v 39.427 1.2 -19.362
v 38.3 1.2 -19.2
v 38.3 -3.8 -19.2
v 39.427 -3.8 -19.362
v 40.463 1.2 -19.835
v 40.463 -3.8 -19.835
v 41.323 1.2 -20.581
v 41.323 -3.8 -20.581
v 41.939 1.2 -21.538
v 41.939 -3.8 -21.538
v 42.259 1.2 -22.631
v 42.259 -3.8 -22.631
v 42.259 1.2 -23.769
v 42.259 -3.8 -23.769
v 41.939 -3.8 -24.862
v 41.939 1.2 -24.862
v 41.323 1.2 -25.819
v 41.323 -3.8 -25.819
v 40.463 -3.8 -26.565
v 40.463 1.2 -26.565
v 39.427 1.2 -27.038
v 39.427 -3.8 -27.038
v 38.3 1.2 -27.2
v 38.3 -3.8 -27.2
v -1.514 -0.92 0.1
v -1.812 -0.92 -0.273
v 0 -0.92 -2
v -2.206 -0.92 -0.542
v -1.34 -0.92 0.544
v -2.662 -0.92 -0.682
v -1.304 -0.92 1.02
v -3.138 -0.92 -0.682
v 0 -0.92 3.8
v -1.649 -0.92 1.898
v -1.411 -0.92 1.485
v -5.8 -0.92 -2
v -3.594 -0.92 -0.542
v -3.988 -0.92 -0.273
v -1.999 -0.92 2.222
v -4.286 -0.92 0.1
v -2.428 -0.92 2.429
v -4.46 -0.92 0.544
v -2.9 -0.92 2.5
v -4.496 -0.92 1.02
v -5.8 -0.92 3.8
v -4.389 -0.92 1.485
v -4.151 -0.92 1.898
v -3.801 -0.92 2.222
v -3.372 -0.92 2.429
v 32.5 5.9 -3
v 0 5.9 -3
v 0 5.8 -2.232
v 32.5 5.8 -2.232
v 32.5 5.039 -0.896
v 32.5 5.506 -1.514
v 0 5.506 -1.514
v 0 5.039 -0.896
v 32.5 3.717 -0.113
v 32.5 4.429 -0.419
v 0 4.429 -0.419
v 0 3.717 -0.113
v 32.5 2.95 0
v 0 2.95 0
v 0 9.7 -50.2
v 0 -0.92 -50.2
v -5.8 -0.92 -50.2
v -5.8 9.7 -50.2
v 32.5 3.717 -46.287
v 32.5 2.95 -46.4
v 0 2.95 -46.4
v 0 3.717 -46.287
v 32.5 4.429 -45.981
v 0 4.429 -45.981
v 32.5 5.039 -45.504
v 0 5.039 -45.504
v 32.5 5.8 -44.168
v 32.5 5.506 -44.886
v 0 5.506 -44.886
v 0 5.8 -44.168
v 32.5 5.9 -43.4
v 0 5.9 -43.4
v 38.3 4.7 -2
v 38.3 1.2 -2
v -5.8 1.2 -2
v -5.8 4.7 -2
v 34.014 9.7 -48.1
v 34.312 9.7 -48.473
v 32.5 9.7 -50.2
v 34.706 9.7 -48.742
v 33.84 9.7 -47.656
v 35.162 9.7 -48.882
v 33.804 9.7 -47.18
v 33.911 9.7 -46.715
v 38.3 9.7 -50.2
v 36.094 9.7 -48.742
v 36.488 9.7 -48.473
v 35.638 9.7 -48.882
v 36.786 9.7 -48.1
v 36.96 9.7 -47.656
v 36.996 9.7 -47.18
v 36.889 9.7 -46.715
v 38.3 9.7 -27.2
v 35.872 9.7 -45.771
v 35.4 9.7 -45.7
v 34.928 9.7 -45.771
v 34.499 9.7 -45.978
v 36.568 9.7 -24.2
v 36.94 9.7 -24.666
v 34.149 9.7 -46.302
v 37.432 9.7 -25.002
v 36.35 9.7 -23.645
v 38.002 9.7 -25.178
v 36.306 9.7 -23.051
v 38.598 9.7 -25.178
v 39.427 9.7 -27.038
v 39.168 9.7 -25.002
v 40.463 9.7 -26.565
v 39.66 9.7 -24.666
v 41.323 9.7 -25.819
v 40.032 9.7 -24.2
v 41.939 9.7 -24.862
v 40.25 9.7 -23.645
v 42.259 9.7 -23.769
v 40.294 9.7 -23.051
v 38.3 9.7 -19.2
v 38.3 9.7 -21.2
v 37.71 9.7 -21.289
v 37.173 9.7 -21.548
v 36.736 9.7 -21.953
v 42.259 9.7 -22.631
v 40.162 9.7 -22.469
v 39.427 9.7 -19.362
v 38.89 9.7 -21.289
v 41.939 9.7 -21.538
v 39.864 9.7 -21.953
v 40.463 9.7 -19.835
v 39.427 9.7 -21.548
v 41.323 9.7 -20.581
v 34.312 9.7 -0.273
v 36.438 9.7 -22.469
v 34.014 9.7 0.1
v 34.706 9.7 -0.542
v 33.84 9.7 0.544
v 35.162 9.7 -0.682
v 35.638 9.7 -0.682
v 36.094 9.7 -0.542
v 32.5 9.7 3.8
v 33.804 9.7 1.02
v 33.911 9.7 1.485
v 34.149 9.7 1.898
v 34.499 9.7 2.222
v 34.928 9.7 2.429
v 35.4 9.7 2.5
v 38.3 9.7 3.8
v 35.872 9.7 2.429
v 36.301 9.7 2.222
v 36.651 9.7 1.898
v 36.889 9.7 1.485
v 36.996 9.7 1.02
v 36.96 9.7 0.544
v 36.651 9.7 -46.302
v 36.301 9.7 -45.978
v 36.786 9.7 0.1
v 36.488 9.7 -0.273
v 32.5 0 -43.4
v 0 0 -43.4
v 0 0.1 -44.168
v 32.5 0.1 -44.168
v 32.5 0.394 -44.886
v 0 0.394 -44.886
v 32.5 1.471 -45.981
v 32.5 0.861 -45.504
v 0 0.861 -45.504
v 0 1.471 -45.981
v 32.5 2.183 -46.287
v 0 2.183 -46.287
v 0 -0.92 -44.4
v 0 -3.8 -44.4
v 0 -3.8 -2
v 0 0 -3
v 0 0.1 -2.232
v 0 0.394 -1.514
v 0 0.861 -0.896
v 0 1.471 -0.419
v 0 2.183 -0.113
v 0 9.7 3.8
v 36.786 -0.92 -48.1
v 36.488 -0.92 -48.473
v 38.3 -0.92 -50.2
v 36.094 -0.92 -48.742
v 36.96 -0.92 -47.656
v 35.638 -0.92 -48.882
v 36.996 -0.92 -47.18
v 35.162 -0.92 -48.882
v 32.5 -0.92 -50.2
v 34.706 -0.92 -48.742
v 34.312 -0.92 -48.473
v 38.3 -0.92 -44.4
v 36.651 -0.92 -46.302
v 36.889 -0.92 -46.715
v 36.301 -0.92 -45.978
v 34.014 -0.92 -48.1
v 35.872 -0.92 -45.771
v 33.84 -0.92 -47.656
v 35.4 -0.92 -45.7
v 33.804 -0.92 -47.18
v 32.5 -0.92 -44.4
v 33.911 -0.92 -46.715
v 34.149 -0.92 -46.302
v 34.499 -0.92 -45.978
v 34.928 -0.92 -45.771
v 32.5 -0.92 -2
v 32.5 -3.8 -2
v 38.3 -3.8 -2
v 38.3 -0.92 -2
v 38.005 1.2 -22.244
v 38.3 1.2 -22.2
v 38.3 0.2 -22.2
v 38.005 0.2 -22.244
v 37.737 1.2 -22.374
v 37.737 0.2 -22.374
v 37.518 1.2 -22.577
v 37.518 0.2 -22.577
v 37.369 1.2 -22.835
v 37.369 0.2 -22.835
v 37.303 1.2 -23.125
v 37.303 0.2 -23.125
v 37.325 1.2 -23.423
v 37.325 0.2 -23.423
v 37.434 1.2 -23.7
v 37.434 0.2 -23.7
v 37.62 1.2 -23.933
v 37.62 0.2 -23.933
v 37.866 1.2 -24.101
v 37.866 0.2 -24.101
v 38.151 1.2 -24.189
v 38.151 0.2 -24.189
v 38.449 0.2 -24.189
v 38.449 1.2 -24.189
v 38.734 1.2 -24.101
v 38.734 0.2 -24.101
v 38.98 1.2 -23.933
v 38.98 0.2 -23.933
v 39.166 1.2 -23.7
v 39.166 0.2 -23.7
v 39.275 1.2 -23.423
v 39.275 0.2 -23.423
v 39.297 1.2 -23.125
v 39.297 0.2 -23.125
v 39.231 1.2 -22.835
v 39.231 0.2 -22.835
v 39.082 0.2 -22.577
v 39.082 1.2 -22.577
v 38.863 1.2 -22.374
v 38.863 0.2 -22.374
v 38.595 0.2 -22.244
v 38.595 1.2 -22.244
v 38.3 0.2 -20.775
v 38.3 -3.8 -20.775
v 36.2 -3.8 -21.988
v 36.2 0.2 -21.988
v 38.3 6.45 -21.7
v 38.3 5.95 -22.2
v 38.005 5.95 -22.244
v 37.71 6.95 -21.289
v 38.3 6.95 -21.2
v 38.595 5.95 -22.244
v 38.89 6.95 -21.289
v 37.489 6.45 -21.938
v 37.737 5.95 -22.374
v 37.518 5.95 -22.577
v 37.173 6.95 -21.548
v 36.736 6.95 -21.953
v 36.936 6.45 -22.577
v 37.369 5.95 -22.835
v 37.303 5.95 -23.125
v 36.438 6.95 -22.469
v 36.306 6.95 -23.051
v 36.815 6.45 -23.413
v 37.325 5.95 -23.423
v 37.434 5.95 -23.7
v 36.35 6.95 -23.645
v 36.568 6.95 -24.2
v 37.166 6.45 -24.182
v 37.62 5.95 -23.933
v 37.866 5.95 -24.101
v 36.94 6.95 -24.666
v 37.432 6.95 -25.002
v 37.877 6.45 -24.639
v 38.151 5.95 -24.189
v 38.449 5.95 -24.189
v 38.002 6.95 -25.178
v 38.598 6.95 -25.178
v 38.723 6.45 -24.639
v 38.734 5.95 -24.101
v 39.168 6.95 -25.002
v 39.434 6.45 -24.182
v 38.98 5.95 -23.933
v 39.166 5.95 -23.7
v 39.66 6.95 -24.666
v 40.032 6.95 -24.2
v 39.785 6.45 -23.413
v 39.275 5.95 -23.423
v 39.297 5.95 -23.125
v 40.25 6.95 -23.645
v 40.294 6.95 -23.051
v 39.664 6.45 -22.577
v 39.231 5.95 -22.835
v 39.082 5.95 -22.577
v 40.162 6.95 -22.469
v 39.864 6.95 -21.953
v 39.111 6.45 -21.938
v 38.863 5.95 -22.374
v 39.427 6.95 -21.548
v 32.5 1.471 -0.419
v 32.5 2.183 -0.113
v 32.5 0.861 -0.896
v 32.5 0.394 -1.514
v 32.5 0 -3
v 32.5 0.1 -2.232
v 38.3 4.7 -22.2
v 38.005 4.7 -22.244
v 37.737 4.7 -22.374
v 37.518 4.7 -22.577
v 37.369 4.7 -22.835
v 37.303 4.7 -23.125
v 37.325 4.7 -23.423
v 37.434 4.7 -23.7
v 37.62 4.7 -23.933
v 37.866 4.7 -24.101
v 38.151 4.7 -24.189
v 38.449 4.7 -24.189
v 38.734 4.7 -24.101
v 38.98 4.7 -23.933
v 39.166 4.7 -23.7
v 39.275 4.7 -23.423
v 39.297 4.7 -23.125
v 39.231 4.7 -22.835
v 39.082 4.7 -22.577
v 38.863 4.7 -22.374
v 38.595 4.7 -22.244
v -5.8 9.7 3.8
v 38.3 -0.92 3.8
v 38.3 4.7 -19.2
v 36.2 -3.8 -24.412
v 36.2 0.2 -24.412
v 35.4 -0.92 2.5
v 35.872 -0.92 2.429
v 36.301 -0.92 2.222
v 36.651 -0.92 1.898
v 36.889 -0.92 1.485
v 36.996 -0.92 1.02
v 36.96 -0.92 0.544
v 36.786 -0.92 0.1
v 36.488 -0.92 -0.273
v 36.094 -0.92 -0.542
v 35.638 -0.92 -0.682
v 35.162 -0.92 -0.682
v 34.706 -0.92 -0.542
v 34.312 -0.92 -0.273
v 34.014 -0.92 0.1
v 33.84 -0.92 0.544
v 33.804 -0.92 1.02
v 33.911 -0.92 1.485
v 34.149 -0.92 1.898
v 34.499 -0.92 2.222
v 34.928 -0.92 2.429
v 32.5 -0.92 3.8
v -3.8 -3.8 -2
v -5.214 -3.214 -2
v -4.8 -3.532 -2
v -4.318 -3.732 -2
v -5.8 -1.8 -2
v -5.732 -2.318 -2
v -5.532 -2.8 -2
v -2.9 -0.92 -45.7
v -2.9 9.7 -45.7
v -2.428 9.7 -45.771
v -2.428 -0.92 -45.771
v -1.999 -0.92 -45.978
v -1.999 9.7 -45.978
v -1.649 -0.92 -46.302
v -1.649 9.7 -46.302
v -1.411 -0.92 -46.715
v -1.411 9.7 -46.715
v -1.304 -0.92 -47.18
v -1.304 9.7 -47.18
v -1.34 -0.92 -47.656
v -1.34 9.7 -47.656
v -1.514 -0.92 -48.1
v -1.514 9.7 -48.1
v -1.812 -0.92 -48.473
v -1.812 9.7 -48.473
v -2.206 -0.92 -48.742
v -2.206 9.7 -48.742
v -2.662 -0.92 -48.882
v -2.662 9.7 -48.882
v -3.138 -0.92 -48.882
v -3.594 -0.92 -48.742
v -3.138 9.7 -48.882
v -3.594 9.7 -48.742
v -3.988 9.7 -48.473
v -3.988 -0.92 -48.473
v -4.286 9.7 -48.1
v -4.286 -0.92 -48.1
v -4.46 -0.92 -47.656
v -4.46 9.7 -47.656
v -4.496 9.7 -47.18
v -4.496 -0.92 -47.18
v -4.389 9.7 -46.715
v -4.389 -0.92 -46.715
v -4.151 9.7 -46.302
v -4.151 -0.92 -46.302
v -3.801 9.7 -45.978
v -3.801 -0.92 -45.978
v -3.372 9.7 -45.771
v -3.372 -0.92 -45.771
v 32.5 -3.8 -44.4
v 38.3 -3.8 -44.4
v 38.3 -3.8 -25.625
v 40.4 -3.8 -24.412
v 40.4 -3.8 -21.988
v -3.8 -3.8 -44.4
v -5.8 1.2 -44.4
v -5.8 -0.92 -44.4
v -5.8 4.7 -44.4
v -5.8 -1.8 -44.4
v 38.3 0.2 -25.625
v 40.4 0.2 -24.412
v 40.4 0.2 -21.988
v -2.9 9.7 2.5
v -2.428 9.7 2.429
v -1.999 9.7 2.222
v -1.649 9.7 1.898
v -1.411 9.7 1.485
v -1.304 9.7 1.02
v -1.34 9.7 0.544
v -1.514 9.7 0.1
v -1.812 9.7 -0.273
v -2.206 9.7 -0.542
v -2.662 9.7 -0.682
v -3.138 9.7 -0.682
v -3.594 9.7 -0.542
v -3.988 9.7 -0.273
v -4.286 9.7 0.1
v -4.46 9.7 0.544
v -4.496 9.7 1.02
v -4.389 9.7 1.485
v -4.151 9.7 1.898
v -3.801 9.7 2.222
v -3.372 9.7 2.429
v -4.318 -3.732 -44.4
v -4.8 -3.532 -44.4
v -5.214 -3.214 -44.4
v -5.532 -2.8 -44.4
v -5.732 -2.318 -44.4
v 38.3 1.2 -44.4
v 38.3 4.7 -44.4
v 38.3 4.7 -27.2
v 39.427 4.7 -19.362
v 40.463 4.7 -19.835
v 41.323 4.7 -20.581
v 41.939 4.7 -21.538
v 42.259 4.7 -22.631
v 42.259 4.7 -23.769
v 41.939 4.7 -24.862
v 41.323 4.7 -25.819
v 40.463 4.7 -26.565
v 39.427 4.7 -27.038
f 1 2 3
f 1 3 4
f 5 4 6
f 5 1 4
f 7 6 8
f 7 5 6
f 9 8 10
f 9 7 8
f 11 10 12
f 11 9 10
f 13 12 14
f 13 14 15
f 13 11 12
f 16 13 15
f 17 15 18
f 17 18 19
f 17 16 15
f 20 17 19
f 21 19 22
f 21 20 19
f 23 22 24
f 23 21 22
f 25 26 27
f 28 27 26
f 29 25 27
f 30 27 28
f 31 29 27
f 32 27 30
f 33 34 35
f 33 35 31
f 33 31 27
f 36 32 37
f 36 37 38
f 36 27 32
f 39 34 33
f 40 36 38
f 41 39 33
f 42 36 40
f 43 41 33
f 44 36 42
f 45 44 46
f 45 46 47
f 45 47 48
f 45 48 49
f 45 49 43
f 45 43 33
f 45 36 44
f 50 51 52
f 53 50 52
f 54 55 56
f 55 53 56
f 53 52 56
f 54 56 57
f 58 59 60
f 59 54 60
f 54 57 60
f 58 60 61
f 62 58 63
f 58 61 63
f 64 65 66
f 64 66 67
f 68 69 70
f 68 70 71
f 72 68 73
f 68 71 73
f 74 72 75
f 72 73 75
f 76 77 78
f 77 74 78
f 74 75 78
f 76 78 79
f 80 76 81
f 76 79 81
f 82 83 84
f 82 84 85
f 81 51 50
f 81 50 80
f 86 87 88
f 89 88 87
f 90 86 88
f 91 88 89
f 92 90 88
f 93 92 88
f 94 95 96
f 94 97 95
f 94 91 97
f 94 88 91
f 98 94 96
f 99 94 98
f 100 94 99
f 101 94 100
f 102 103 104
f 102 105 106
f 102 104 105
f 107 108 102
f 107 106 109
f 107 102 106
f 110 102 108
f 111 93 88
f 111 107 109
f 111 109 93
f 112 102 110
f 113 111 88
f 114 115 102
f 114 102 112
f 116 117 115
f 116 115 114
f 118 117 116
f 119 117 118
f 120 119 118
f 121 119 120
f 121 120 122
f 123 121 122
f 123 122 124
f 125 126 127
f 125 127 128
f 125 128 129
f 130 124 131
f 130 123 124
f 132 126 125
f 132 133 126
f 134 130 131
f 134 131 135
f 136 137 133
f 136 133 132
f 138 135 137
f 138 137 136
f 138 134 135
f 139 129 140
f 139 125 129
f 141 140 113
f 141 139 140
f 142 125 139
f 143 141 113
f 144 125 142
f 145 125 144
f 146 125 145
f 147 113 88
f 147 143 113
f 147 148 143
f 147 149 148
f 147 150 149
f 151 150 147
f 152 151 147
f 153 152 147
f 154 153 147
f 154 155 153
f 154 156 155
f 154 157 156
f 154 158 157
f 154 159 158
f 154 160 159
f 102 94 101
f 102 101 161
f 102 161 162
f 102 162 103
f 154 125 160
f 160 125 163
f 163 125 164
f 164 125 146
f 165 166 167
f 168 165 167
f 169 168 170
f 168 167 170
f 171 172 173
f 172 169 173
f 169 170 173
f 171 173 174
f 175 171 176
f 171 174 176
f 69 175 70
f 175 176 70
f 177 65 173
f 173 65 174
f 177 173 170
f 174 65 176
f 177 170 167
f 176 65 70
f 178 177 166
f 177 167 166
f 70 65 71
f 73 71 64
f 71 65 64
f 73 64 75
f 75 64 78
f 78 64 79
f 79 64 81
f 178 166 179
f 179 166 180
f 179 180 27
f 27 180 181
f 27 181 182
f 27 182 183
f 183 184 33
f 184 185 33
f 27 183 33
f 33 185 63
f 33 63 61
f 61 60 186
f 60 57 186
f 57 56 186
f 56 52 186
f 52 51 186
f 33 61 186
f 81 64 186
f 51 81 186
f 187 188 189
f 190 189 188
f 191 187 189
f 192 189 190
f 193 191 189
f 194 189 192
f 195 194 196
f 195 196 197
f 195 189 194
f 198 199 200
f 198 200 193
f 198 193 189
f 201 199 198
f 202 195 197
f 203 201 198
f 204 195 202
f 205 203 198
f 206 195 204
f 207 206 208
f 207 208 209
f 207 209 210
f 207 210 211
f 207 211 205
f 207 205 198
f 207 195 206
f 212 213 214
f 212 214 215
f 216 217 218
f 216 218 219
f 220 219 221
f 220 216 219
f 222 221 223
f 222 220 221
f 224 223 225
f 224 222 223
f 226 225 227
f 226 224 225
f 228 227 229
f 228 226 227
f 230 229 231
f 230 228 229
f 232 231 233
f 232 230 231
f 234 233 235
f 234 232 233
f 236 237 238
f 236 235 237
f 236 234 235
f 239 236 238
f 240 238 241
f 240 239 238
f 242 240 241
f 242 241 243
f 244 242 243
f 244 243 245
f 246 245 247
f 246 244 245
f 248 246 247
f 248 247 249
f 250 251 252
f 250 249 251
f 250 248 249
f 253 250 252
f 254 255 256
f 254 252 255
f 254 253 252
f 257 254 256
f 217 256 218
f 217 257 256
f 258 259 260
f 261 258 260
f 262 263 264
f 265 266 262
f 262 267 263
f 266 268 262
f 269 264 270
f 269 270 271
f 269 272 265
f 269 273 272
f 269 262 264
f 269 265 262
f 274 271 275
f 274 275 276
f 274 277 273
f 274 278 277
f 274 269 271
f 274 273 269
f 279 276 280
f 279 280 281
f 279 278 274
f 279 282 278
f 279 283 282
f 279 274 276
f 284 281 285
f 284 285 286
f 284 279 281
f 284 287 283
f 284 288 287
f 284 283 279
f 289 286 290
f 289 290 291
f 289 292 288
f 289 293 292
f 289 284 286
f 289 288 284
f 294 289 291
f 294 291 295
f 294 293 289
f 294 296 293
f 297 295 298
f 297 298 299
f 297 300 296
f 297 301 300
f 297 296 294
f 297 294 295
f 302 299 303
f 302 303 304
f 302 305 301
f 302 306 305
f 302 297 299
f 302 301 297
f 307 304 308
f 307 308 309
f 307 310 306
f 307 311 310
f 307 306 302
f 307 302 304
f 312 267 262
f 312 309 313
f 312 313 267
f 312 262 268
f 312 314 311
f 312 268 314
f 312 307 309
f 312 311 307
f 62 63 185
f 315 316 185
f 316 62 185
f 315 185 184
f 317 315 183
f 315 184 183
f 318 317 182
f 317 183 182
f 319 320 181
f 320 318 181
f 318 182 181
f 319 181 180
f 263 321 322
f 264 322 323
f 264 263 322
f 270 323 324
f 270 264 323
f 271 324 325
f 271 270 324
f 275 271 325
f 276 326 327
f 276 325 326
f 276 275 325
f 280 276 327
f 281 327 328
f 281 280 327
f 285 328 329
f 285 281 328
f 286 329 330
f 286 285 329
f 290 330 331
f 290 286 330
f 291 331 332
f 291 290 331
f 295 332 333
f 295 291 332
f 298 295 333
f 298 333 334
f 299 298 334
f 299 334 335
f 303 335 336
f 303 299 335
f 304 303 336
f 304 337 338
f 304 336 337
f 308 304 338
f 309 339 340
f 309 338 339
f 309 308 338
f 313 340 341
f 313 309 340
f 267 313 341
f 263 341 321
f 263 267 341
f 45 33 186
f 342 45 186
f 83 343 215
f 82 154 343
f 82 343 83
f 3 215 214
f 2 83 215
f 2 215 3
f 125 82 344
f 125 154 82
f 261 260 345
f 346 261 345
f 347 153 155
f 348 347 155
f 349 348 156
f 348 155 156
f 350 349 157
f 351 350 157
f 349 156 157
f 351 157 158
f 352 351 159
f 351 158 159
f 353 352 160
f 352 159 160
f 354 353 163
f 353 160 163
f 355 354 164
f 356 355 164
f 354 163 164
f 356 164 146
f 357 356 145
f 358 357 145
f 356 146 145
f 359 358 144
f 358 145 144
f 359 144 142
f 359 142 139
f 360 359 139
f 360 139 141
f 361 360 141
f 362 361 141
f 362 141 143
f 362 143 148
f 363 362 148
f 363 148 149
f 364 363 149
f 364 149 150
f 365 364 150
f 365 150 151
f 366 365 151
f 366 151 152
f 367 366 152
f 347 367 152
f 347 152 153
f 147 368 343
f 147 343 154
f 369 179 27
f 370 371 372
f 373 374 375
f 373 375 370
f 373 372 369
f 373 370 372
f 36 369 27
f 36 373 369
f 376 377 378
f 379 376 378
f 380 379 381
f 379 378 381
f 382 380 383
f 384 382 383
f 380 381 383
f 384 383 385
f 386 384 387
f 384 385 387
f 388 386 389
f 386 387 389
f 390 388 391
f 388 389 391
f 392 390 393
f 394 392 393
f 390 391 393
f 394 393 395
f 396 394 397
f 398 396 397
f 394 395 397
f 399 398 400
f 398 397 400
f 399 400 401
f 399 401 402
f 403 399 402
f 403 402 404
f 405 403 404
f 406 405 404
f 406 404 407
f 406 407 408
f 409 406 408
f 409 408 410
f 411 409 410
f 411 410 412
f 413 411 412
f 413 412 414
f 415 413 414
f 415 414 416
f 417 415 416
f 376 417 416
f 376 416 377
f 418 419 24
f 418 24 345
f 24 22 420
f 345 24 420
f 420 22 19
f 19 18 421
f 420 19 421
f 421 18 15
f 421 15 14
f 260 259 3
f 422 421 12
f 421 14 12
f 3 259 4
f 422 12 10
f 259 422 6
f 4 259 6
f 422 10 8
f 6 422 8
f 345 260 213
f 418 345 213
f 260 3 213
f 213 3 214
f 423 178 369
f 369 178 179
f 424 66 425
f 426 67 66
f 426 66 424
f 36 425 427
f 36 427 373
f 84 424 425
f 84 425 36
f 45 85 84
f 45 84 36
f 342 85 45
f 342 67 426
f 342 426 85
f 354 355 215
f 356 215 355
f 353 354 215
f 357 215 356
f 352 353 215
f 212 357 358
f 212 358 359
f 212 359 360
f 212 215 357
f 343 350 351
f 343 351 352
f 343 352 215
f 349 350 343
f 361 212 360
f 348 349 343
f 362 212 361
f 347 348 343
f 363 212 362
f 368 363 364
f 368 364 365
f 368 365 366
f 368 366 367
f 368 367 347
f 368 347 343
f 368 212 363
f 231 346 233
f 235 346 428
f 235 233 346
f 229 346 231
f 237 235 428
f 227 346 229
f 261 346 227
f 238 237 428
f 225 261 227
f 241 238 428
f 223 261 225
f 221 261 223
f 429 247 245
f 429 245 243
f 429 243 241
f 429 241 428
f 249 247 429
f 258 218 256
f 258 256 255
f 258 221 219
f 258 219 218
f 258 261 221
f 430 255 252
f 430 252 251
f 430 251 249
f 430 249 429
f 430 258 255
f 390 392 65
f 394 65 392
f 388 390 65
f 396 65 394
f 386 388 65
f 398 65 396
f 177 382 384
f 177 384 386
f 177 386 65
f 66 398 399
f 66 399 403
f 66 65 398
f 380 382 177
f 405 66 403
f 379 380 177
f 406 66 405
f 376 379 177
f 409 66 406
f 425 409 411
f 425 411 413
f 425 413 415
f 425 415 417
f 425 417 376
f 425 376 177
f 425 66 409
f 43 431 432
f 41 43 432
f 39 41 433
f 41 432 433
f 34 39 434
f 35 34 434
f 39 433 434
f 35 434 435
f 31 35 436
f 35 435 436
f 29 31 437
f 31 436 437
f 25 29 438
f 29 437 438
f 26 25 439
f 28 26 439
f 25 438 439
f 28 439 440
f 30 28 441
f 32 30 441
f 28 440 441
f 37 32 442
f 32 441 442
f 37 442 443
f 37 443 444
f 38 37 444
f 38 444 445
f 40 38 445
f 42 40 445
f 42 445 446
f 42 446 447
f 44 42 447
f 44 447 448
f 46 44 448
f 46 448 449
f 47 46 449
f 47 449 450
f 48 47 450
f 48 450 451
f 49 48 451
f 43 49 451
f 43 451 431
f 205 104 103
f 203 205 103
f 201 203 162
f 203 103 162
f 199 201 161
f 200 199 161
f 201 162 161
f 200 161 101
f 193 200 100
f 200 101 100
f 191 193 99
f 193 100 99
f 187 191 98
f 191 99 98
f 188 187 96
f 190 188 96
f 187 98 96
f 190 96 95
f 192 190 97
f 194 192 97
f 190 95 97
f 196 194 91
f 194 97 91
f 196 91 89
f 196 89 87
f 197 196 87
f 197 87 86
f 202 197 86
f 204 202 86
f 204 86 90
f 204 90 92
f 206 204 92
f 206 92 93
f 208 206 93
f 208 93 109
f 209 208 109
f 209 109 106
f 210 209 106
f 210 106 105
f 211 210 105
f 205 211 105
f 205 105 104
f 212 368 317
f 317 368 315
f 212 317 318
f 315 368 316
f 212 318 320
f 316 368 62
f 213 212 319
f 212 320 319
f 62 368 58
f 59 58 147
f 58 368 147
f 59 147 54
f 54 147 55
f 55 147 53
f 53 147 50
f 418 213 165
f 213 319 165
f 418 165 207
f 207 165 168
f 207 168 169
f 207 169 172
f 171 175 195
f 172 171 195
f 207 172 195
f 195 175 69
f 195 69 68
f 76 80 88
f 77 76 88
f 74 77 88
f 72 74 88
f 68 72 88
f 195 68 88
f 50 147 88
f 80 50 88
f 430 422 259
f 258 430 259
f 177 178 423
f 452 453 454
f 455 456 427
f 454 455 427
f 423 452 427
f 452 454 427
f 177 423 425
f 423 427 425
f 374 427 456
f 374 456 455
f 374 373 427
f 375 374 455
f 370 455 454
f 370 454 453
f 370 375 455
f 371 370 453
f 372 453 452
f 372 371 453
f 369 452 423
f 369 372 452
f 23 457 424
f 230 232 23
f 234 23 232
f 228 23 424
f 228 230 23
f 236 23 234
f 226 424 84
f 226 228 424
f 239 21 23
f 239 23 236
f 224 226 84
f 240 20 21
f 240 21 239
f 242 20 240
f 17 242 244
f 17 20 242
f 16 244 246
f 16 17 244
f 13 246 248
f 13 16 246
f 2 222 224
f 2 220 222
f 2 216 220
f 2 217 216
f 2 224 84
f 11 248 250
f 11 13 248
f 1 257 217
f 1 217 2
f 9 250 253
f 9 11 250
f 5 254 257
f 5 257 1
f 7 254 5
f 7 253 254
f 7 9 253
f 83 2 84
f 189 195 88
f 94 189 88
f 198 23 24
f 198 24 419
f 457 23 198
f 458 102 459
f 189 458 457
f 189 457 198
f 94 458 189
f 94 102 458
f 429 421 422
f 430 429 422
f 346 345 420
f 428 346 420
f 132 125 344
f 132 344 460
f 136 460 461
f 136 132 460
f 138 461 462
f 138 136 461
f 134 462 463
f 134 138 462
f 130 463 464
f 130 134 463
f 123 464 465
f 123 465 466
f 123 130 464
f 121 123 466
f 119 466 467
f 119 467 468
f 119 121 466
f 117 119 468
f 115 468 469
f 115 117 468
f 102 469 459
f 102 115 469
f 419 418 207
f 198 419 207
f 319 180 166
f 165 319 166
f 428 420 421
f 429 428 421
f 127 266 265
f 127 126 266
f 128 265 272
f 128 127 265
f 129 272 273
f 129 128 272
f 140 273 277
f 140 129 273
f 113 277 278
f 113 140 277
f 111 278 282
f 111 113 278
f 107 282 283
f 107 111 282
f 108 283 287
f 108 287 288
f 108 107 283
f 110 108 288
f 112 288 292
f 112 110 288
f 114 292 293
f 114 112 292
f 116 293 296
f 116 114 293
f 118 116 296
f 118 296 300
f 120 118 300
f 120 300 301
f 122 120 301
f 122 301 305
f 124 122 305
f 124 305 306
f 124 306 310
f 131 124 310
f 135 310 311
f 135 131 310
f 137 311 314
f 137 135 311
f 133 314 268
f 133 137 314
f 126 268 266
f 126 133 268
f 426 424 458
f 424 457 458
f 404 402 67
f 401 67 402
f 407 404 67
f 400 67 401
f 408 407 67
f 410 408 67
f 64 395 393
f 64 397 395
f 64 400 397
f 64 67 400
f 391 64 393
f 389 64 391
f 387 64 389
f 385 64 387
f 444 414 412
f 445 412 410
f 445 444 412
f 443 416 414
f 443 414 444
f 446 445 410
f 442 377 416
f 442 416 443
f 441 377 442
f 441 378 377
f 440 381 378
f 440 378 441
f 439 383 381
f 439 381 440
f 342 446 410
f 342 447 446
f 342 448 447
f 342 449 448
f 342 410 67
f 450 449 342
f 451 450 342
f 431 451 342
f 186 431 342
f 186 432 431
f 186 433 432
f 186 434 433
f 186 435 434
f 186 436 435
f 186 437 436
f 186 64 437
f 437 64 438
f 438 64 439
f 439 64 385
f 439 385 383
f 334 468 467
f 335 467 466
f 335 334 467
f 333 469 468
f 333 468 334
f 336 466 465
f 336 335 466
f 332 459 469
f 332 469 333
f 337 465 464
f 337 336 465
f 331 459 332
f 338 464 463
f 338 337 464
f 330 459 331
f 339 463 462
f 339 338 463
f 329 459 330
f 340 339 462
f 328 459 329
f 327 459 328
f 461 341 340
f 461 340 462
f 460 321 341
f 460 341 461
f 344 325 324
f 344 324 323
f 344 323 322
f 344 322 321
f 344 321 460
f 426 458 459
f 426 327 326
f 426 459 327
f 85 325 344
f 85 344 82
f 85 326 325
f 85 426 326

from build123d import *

# Parameters (mm, degrees)
SKETCH1_W           = 46.4
SKETCH1_H           = 5.9
SKETCH1_W_2         = 42.4
SKETCH1_H_2         = 3.5
BOSS_EXTRUDE1_DEPTH = 32.5
FILLET2_R           = 3
SKETCH2_W           = 54
SKETCH2_H           = 13.5
SKETCH2_W_2         = 42.4
SKETCH2_H_2         = 3.5
BOSS_EXTRUDE2_DEPTH = 5.8
SKETCH3_W           = 54
SKETCH3_H           = 13.5
SKETCH3_W_2         = 42.4
SKETCH3_H_2         = 3.5
BOSS_EXTRUDE3_DEPTH = 5.8
SKETCH4_R           = 1.6
CUT_EXTRUDE1_DEPTH  = 65.569187698
SKETCH8_R           = 4
BOSS_EXTRUDE4_DEPTH = 13.5
CUT_EXTRUDE4_DEPTH  = 4
SKETCH15_W          = 42.4
SKETCH15_H          = 3.5
SKETCH15_W_2        = 5.8
SKETCH15_H_2        = 2.88
CUT_EXTRUDE5_DEPTH  = 71.197863215
FILLET3_R           = 2


with BuildPart() as part:
    # Sketch1 → Boss-Extrude1 (new body)
    with BuildSketch(Plane(origin=(0, 0, 0), x_dir=(0, 0, -1), z_dir=(1, 0, 0))):
        with Locations((23.2, 2.95)):
            Rectangle(SKETCH1_W, SKETCH1_H)
        with Locations((23.2, 2.95)):
            Rectangle(SKETCH1_W_2, SKETCH1_H_2, mode=Mode.SUBTRACT)
    extrude(amount=BOSS_EXTRUDE1_DEPTH)

    # Fillet2
    # the kernel refuses this fillet: 3 mm, written as the material it takes off along each edge
    with BuildSketch(Plane(origin=(-7.5, 0, -46.4), x_dir=(0, 0, 1), z_dir=(1, 0, 0)), Plane(origin=(-7.5, 5.9, 0), x_dir=(0, 0, -1), z_dir=(1, 0, 0)), Plane(origin=(-7.5, 5.9, -46.4), x_dir=(0, -1, 0), z_dir=(1, 0, 0))) as fillet2_piece_1:
        with BuildLine():
            CenterArc((FILLET2_R, -FILLET2_R), FILLET2_R, 90, 90)
            Line((0, -FILLET2_R), (0, 0))
            Line((0, 0), (FILLET2_R, 0))
        make_face()
    extrude(amount=47.5, mode=Mode.SUBTRACT)
    with BuildSketch(Plane(origin=(-7.5, 0, 0), x_dir=(0, 0, -1), z_dir=(1, 0, 0))) as fillet2_piece_2:
        with BuildLine():
            CenterArc((FILLET2_R, FILLET2_R), FILLET2_R, 180, 90)
            Line((0, FILLET2_R), (0, 0))
            Line((0, 0), (FILLET2_R, 0))
        make_face()
    extrude(amount=47.5, mode=Mode.SUBTRACT)

    # Sketch2 → Boss-Extrude2 (add)
    with BuildSketch(Plane(origin=(32.5, 0, 0), x_dir=(0, 0, -1), z_dir=(1, 0, 0))):
        with Locations((23.2, 2.95)):
            Rectangle(SKETCH2_W, SKETCH2_H)
        with Locations((23.2, 2.95)):
            Rectangle(SKETCH2_W_2, SKETCH2_H_2, mode=Mode.SUBTRACT)
    extrude(amount=BOSS_EXTRUDE2_DEPTH)

    # Sketch3 → Boss-Extrude3 (add)
    with BuildSketch(Plane.ZY):
        with Locations((-23.2, 2.95)):
            Rectangle(SKETCH3_W, SKETCH3_H)
        with Locations((-23.2, 2.95)):
            Rectangle(SKETCH3_W_2, SKETCH3_H_2, mode=Mode.SUBTRACT)
    extrude(amount=BOSS_EXTRUDE3_DEPTH)

    # Sketch4 → Cut-Extrude1 (cut, through all)
    with BuildSketch(Plane(origin=(0, 9.7, 0), x_dir=(1, 0, 0), z_dir=(0, 1, 0))):
        with Locations(Location((-2.9, 47.3, 0), (0, 0, 270))):
            Circle(SKETCH4_R)
        with Locations(Location((35.4, 47.3, 0), (0, 0, 270))):
            Circle(SKETCH4_R)
        with Locations(Location((-2.9, -0.9, 0), (0, 0, 270))):
            Circle(SKETCH4_R)
        with Locations(Location((35.4, -0.9, 0), (0, 0, 270))):
            Circle(SKETCH4_R)
    extrude(amount=-CUT_EXTRUDE1_DEPTH, mode=Mode.SUBTRACT)

    # Sketch8 → Boss-Extrude4 (add)
    with BuildSketch(Plane(origin=(0, 9.7, 0), x_dir=(1, 0, 0), z_dir=(0, 1, 0))):
        with Locations(Location((38.3, 23.2, 0), (0, 0, 270))):
            Circle(SKETCH8_R)
    extrude(amount=-BOSS_EXTRUDE4_DEPTH)

    # Sketch13 → CSK for M2 Flat Head Machine Screw1 (revolve, cut)
    with BuildSketch(Plane(origin=(38.3, 9.7, -23.2), x_dir=(0, 0, 1), z_dir=(1, 0, 0))):
        Polygon((0, 0), (0, 13.5), (1, 13.5), (1, 3.75), (2, 2.75), (2, 0), align=None)
    revolve(axis=Axis((38.3, 16.05, -23.2), (0, -1, 0)), mode=Mode.SUBTRACT)

    # Sketch14 → Cut-Extrude4 (cut)
    with BuildSketch(Plane.XZ.offset(3.8)):
        Polygon((38.3, -20.775128869), (36.2, -21.987564435), (36.2, -24.412435565), (38.3, -25.624871131), (40.4, -24.412435565), (40.4, -21.987564435), align=None)
    extrude(amount=-CUT_EXTRUDE4_DEPTH, mode=Mode.SUBTRACT)

    # Sketch15 → Cut-Extrude5 (cut, through all)
    with BuildSketch(Plane.ZY.offset(5.8)):
        with Locations((-23.2, 2.95)):
            Rectangle(SKETCH15_W, SKETCH15_H)
        with Locations((-47.3, -2.36)):
            Rectangle(SKETCH15_W_2, SKETCH15_H_2)
        with Locations((0.9, -2.36)):
            Rectangle(SKETCH15_W_2, SKETCH15_H_2)
    extrude(amount=-CUT_EXTRUDE5_DEPTH, mode=Mode.SUBTRACT)

    # Fillet3
    fillet3_edges = [part.edges().sort_by_distance(p)[0] for p in [
        (-5.8, -3.8, -23.2),
    ]]
    fillet(fillet3_edges, radius=FILLET3_R)


solid = part.part
